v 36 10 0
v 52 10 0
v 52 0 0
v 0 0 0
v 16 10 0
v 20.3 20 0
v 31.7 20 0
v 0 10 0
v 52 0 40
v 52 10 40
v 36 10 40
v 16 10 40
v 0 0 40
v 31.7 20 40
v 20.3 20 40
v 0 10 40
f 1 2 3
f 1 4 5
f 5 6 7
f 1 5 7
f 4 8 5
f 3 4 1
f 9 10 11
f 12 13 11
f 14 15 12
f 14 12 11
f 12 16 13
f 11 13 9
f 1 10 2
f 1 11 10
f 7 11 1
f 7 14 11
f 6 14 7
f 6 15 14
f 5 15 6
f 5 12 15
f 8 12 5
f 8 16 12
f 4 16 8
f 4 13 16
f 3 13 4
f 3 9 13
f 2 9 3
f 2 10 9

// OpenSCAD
$fn = 32;

// ----------------------------------------------------------------------
// V guide rail: dovetail, 52 mm wide
// ----------------------------------------------------------------------

// --- parameters (mm) ---
rail_w = 52;              // rail width, X
base_t = 10;              // base plate thickness
v_depth = 10;             // V feature depth / height
v_half_w = 10;            // half width of the V at the base face
plate_t = 40;             // rail length, Z (the extrusion height)
top_half_w = 5.7;         // half width at the dovetail top

dovetail_base = 2 * v_half_w;  // dovetail width at the base
dovetail_top = 2 * top_half_w;  // dovetail width at the top

profile = [[0, 0], [52, 0], [52, 10], [36, 10], [31.7, 20], [20.3, 20], [16, 10], [0, 10]];  // primary outline, 8 points, counter clockwise

// --- the one profile operation ---
linear_extrude(height = plate_t) polygon(points = profile);
